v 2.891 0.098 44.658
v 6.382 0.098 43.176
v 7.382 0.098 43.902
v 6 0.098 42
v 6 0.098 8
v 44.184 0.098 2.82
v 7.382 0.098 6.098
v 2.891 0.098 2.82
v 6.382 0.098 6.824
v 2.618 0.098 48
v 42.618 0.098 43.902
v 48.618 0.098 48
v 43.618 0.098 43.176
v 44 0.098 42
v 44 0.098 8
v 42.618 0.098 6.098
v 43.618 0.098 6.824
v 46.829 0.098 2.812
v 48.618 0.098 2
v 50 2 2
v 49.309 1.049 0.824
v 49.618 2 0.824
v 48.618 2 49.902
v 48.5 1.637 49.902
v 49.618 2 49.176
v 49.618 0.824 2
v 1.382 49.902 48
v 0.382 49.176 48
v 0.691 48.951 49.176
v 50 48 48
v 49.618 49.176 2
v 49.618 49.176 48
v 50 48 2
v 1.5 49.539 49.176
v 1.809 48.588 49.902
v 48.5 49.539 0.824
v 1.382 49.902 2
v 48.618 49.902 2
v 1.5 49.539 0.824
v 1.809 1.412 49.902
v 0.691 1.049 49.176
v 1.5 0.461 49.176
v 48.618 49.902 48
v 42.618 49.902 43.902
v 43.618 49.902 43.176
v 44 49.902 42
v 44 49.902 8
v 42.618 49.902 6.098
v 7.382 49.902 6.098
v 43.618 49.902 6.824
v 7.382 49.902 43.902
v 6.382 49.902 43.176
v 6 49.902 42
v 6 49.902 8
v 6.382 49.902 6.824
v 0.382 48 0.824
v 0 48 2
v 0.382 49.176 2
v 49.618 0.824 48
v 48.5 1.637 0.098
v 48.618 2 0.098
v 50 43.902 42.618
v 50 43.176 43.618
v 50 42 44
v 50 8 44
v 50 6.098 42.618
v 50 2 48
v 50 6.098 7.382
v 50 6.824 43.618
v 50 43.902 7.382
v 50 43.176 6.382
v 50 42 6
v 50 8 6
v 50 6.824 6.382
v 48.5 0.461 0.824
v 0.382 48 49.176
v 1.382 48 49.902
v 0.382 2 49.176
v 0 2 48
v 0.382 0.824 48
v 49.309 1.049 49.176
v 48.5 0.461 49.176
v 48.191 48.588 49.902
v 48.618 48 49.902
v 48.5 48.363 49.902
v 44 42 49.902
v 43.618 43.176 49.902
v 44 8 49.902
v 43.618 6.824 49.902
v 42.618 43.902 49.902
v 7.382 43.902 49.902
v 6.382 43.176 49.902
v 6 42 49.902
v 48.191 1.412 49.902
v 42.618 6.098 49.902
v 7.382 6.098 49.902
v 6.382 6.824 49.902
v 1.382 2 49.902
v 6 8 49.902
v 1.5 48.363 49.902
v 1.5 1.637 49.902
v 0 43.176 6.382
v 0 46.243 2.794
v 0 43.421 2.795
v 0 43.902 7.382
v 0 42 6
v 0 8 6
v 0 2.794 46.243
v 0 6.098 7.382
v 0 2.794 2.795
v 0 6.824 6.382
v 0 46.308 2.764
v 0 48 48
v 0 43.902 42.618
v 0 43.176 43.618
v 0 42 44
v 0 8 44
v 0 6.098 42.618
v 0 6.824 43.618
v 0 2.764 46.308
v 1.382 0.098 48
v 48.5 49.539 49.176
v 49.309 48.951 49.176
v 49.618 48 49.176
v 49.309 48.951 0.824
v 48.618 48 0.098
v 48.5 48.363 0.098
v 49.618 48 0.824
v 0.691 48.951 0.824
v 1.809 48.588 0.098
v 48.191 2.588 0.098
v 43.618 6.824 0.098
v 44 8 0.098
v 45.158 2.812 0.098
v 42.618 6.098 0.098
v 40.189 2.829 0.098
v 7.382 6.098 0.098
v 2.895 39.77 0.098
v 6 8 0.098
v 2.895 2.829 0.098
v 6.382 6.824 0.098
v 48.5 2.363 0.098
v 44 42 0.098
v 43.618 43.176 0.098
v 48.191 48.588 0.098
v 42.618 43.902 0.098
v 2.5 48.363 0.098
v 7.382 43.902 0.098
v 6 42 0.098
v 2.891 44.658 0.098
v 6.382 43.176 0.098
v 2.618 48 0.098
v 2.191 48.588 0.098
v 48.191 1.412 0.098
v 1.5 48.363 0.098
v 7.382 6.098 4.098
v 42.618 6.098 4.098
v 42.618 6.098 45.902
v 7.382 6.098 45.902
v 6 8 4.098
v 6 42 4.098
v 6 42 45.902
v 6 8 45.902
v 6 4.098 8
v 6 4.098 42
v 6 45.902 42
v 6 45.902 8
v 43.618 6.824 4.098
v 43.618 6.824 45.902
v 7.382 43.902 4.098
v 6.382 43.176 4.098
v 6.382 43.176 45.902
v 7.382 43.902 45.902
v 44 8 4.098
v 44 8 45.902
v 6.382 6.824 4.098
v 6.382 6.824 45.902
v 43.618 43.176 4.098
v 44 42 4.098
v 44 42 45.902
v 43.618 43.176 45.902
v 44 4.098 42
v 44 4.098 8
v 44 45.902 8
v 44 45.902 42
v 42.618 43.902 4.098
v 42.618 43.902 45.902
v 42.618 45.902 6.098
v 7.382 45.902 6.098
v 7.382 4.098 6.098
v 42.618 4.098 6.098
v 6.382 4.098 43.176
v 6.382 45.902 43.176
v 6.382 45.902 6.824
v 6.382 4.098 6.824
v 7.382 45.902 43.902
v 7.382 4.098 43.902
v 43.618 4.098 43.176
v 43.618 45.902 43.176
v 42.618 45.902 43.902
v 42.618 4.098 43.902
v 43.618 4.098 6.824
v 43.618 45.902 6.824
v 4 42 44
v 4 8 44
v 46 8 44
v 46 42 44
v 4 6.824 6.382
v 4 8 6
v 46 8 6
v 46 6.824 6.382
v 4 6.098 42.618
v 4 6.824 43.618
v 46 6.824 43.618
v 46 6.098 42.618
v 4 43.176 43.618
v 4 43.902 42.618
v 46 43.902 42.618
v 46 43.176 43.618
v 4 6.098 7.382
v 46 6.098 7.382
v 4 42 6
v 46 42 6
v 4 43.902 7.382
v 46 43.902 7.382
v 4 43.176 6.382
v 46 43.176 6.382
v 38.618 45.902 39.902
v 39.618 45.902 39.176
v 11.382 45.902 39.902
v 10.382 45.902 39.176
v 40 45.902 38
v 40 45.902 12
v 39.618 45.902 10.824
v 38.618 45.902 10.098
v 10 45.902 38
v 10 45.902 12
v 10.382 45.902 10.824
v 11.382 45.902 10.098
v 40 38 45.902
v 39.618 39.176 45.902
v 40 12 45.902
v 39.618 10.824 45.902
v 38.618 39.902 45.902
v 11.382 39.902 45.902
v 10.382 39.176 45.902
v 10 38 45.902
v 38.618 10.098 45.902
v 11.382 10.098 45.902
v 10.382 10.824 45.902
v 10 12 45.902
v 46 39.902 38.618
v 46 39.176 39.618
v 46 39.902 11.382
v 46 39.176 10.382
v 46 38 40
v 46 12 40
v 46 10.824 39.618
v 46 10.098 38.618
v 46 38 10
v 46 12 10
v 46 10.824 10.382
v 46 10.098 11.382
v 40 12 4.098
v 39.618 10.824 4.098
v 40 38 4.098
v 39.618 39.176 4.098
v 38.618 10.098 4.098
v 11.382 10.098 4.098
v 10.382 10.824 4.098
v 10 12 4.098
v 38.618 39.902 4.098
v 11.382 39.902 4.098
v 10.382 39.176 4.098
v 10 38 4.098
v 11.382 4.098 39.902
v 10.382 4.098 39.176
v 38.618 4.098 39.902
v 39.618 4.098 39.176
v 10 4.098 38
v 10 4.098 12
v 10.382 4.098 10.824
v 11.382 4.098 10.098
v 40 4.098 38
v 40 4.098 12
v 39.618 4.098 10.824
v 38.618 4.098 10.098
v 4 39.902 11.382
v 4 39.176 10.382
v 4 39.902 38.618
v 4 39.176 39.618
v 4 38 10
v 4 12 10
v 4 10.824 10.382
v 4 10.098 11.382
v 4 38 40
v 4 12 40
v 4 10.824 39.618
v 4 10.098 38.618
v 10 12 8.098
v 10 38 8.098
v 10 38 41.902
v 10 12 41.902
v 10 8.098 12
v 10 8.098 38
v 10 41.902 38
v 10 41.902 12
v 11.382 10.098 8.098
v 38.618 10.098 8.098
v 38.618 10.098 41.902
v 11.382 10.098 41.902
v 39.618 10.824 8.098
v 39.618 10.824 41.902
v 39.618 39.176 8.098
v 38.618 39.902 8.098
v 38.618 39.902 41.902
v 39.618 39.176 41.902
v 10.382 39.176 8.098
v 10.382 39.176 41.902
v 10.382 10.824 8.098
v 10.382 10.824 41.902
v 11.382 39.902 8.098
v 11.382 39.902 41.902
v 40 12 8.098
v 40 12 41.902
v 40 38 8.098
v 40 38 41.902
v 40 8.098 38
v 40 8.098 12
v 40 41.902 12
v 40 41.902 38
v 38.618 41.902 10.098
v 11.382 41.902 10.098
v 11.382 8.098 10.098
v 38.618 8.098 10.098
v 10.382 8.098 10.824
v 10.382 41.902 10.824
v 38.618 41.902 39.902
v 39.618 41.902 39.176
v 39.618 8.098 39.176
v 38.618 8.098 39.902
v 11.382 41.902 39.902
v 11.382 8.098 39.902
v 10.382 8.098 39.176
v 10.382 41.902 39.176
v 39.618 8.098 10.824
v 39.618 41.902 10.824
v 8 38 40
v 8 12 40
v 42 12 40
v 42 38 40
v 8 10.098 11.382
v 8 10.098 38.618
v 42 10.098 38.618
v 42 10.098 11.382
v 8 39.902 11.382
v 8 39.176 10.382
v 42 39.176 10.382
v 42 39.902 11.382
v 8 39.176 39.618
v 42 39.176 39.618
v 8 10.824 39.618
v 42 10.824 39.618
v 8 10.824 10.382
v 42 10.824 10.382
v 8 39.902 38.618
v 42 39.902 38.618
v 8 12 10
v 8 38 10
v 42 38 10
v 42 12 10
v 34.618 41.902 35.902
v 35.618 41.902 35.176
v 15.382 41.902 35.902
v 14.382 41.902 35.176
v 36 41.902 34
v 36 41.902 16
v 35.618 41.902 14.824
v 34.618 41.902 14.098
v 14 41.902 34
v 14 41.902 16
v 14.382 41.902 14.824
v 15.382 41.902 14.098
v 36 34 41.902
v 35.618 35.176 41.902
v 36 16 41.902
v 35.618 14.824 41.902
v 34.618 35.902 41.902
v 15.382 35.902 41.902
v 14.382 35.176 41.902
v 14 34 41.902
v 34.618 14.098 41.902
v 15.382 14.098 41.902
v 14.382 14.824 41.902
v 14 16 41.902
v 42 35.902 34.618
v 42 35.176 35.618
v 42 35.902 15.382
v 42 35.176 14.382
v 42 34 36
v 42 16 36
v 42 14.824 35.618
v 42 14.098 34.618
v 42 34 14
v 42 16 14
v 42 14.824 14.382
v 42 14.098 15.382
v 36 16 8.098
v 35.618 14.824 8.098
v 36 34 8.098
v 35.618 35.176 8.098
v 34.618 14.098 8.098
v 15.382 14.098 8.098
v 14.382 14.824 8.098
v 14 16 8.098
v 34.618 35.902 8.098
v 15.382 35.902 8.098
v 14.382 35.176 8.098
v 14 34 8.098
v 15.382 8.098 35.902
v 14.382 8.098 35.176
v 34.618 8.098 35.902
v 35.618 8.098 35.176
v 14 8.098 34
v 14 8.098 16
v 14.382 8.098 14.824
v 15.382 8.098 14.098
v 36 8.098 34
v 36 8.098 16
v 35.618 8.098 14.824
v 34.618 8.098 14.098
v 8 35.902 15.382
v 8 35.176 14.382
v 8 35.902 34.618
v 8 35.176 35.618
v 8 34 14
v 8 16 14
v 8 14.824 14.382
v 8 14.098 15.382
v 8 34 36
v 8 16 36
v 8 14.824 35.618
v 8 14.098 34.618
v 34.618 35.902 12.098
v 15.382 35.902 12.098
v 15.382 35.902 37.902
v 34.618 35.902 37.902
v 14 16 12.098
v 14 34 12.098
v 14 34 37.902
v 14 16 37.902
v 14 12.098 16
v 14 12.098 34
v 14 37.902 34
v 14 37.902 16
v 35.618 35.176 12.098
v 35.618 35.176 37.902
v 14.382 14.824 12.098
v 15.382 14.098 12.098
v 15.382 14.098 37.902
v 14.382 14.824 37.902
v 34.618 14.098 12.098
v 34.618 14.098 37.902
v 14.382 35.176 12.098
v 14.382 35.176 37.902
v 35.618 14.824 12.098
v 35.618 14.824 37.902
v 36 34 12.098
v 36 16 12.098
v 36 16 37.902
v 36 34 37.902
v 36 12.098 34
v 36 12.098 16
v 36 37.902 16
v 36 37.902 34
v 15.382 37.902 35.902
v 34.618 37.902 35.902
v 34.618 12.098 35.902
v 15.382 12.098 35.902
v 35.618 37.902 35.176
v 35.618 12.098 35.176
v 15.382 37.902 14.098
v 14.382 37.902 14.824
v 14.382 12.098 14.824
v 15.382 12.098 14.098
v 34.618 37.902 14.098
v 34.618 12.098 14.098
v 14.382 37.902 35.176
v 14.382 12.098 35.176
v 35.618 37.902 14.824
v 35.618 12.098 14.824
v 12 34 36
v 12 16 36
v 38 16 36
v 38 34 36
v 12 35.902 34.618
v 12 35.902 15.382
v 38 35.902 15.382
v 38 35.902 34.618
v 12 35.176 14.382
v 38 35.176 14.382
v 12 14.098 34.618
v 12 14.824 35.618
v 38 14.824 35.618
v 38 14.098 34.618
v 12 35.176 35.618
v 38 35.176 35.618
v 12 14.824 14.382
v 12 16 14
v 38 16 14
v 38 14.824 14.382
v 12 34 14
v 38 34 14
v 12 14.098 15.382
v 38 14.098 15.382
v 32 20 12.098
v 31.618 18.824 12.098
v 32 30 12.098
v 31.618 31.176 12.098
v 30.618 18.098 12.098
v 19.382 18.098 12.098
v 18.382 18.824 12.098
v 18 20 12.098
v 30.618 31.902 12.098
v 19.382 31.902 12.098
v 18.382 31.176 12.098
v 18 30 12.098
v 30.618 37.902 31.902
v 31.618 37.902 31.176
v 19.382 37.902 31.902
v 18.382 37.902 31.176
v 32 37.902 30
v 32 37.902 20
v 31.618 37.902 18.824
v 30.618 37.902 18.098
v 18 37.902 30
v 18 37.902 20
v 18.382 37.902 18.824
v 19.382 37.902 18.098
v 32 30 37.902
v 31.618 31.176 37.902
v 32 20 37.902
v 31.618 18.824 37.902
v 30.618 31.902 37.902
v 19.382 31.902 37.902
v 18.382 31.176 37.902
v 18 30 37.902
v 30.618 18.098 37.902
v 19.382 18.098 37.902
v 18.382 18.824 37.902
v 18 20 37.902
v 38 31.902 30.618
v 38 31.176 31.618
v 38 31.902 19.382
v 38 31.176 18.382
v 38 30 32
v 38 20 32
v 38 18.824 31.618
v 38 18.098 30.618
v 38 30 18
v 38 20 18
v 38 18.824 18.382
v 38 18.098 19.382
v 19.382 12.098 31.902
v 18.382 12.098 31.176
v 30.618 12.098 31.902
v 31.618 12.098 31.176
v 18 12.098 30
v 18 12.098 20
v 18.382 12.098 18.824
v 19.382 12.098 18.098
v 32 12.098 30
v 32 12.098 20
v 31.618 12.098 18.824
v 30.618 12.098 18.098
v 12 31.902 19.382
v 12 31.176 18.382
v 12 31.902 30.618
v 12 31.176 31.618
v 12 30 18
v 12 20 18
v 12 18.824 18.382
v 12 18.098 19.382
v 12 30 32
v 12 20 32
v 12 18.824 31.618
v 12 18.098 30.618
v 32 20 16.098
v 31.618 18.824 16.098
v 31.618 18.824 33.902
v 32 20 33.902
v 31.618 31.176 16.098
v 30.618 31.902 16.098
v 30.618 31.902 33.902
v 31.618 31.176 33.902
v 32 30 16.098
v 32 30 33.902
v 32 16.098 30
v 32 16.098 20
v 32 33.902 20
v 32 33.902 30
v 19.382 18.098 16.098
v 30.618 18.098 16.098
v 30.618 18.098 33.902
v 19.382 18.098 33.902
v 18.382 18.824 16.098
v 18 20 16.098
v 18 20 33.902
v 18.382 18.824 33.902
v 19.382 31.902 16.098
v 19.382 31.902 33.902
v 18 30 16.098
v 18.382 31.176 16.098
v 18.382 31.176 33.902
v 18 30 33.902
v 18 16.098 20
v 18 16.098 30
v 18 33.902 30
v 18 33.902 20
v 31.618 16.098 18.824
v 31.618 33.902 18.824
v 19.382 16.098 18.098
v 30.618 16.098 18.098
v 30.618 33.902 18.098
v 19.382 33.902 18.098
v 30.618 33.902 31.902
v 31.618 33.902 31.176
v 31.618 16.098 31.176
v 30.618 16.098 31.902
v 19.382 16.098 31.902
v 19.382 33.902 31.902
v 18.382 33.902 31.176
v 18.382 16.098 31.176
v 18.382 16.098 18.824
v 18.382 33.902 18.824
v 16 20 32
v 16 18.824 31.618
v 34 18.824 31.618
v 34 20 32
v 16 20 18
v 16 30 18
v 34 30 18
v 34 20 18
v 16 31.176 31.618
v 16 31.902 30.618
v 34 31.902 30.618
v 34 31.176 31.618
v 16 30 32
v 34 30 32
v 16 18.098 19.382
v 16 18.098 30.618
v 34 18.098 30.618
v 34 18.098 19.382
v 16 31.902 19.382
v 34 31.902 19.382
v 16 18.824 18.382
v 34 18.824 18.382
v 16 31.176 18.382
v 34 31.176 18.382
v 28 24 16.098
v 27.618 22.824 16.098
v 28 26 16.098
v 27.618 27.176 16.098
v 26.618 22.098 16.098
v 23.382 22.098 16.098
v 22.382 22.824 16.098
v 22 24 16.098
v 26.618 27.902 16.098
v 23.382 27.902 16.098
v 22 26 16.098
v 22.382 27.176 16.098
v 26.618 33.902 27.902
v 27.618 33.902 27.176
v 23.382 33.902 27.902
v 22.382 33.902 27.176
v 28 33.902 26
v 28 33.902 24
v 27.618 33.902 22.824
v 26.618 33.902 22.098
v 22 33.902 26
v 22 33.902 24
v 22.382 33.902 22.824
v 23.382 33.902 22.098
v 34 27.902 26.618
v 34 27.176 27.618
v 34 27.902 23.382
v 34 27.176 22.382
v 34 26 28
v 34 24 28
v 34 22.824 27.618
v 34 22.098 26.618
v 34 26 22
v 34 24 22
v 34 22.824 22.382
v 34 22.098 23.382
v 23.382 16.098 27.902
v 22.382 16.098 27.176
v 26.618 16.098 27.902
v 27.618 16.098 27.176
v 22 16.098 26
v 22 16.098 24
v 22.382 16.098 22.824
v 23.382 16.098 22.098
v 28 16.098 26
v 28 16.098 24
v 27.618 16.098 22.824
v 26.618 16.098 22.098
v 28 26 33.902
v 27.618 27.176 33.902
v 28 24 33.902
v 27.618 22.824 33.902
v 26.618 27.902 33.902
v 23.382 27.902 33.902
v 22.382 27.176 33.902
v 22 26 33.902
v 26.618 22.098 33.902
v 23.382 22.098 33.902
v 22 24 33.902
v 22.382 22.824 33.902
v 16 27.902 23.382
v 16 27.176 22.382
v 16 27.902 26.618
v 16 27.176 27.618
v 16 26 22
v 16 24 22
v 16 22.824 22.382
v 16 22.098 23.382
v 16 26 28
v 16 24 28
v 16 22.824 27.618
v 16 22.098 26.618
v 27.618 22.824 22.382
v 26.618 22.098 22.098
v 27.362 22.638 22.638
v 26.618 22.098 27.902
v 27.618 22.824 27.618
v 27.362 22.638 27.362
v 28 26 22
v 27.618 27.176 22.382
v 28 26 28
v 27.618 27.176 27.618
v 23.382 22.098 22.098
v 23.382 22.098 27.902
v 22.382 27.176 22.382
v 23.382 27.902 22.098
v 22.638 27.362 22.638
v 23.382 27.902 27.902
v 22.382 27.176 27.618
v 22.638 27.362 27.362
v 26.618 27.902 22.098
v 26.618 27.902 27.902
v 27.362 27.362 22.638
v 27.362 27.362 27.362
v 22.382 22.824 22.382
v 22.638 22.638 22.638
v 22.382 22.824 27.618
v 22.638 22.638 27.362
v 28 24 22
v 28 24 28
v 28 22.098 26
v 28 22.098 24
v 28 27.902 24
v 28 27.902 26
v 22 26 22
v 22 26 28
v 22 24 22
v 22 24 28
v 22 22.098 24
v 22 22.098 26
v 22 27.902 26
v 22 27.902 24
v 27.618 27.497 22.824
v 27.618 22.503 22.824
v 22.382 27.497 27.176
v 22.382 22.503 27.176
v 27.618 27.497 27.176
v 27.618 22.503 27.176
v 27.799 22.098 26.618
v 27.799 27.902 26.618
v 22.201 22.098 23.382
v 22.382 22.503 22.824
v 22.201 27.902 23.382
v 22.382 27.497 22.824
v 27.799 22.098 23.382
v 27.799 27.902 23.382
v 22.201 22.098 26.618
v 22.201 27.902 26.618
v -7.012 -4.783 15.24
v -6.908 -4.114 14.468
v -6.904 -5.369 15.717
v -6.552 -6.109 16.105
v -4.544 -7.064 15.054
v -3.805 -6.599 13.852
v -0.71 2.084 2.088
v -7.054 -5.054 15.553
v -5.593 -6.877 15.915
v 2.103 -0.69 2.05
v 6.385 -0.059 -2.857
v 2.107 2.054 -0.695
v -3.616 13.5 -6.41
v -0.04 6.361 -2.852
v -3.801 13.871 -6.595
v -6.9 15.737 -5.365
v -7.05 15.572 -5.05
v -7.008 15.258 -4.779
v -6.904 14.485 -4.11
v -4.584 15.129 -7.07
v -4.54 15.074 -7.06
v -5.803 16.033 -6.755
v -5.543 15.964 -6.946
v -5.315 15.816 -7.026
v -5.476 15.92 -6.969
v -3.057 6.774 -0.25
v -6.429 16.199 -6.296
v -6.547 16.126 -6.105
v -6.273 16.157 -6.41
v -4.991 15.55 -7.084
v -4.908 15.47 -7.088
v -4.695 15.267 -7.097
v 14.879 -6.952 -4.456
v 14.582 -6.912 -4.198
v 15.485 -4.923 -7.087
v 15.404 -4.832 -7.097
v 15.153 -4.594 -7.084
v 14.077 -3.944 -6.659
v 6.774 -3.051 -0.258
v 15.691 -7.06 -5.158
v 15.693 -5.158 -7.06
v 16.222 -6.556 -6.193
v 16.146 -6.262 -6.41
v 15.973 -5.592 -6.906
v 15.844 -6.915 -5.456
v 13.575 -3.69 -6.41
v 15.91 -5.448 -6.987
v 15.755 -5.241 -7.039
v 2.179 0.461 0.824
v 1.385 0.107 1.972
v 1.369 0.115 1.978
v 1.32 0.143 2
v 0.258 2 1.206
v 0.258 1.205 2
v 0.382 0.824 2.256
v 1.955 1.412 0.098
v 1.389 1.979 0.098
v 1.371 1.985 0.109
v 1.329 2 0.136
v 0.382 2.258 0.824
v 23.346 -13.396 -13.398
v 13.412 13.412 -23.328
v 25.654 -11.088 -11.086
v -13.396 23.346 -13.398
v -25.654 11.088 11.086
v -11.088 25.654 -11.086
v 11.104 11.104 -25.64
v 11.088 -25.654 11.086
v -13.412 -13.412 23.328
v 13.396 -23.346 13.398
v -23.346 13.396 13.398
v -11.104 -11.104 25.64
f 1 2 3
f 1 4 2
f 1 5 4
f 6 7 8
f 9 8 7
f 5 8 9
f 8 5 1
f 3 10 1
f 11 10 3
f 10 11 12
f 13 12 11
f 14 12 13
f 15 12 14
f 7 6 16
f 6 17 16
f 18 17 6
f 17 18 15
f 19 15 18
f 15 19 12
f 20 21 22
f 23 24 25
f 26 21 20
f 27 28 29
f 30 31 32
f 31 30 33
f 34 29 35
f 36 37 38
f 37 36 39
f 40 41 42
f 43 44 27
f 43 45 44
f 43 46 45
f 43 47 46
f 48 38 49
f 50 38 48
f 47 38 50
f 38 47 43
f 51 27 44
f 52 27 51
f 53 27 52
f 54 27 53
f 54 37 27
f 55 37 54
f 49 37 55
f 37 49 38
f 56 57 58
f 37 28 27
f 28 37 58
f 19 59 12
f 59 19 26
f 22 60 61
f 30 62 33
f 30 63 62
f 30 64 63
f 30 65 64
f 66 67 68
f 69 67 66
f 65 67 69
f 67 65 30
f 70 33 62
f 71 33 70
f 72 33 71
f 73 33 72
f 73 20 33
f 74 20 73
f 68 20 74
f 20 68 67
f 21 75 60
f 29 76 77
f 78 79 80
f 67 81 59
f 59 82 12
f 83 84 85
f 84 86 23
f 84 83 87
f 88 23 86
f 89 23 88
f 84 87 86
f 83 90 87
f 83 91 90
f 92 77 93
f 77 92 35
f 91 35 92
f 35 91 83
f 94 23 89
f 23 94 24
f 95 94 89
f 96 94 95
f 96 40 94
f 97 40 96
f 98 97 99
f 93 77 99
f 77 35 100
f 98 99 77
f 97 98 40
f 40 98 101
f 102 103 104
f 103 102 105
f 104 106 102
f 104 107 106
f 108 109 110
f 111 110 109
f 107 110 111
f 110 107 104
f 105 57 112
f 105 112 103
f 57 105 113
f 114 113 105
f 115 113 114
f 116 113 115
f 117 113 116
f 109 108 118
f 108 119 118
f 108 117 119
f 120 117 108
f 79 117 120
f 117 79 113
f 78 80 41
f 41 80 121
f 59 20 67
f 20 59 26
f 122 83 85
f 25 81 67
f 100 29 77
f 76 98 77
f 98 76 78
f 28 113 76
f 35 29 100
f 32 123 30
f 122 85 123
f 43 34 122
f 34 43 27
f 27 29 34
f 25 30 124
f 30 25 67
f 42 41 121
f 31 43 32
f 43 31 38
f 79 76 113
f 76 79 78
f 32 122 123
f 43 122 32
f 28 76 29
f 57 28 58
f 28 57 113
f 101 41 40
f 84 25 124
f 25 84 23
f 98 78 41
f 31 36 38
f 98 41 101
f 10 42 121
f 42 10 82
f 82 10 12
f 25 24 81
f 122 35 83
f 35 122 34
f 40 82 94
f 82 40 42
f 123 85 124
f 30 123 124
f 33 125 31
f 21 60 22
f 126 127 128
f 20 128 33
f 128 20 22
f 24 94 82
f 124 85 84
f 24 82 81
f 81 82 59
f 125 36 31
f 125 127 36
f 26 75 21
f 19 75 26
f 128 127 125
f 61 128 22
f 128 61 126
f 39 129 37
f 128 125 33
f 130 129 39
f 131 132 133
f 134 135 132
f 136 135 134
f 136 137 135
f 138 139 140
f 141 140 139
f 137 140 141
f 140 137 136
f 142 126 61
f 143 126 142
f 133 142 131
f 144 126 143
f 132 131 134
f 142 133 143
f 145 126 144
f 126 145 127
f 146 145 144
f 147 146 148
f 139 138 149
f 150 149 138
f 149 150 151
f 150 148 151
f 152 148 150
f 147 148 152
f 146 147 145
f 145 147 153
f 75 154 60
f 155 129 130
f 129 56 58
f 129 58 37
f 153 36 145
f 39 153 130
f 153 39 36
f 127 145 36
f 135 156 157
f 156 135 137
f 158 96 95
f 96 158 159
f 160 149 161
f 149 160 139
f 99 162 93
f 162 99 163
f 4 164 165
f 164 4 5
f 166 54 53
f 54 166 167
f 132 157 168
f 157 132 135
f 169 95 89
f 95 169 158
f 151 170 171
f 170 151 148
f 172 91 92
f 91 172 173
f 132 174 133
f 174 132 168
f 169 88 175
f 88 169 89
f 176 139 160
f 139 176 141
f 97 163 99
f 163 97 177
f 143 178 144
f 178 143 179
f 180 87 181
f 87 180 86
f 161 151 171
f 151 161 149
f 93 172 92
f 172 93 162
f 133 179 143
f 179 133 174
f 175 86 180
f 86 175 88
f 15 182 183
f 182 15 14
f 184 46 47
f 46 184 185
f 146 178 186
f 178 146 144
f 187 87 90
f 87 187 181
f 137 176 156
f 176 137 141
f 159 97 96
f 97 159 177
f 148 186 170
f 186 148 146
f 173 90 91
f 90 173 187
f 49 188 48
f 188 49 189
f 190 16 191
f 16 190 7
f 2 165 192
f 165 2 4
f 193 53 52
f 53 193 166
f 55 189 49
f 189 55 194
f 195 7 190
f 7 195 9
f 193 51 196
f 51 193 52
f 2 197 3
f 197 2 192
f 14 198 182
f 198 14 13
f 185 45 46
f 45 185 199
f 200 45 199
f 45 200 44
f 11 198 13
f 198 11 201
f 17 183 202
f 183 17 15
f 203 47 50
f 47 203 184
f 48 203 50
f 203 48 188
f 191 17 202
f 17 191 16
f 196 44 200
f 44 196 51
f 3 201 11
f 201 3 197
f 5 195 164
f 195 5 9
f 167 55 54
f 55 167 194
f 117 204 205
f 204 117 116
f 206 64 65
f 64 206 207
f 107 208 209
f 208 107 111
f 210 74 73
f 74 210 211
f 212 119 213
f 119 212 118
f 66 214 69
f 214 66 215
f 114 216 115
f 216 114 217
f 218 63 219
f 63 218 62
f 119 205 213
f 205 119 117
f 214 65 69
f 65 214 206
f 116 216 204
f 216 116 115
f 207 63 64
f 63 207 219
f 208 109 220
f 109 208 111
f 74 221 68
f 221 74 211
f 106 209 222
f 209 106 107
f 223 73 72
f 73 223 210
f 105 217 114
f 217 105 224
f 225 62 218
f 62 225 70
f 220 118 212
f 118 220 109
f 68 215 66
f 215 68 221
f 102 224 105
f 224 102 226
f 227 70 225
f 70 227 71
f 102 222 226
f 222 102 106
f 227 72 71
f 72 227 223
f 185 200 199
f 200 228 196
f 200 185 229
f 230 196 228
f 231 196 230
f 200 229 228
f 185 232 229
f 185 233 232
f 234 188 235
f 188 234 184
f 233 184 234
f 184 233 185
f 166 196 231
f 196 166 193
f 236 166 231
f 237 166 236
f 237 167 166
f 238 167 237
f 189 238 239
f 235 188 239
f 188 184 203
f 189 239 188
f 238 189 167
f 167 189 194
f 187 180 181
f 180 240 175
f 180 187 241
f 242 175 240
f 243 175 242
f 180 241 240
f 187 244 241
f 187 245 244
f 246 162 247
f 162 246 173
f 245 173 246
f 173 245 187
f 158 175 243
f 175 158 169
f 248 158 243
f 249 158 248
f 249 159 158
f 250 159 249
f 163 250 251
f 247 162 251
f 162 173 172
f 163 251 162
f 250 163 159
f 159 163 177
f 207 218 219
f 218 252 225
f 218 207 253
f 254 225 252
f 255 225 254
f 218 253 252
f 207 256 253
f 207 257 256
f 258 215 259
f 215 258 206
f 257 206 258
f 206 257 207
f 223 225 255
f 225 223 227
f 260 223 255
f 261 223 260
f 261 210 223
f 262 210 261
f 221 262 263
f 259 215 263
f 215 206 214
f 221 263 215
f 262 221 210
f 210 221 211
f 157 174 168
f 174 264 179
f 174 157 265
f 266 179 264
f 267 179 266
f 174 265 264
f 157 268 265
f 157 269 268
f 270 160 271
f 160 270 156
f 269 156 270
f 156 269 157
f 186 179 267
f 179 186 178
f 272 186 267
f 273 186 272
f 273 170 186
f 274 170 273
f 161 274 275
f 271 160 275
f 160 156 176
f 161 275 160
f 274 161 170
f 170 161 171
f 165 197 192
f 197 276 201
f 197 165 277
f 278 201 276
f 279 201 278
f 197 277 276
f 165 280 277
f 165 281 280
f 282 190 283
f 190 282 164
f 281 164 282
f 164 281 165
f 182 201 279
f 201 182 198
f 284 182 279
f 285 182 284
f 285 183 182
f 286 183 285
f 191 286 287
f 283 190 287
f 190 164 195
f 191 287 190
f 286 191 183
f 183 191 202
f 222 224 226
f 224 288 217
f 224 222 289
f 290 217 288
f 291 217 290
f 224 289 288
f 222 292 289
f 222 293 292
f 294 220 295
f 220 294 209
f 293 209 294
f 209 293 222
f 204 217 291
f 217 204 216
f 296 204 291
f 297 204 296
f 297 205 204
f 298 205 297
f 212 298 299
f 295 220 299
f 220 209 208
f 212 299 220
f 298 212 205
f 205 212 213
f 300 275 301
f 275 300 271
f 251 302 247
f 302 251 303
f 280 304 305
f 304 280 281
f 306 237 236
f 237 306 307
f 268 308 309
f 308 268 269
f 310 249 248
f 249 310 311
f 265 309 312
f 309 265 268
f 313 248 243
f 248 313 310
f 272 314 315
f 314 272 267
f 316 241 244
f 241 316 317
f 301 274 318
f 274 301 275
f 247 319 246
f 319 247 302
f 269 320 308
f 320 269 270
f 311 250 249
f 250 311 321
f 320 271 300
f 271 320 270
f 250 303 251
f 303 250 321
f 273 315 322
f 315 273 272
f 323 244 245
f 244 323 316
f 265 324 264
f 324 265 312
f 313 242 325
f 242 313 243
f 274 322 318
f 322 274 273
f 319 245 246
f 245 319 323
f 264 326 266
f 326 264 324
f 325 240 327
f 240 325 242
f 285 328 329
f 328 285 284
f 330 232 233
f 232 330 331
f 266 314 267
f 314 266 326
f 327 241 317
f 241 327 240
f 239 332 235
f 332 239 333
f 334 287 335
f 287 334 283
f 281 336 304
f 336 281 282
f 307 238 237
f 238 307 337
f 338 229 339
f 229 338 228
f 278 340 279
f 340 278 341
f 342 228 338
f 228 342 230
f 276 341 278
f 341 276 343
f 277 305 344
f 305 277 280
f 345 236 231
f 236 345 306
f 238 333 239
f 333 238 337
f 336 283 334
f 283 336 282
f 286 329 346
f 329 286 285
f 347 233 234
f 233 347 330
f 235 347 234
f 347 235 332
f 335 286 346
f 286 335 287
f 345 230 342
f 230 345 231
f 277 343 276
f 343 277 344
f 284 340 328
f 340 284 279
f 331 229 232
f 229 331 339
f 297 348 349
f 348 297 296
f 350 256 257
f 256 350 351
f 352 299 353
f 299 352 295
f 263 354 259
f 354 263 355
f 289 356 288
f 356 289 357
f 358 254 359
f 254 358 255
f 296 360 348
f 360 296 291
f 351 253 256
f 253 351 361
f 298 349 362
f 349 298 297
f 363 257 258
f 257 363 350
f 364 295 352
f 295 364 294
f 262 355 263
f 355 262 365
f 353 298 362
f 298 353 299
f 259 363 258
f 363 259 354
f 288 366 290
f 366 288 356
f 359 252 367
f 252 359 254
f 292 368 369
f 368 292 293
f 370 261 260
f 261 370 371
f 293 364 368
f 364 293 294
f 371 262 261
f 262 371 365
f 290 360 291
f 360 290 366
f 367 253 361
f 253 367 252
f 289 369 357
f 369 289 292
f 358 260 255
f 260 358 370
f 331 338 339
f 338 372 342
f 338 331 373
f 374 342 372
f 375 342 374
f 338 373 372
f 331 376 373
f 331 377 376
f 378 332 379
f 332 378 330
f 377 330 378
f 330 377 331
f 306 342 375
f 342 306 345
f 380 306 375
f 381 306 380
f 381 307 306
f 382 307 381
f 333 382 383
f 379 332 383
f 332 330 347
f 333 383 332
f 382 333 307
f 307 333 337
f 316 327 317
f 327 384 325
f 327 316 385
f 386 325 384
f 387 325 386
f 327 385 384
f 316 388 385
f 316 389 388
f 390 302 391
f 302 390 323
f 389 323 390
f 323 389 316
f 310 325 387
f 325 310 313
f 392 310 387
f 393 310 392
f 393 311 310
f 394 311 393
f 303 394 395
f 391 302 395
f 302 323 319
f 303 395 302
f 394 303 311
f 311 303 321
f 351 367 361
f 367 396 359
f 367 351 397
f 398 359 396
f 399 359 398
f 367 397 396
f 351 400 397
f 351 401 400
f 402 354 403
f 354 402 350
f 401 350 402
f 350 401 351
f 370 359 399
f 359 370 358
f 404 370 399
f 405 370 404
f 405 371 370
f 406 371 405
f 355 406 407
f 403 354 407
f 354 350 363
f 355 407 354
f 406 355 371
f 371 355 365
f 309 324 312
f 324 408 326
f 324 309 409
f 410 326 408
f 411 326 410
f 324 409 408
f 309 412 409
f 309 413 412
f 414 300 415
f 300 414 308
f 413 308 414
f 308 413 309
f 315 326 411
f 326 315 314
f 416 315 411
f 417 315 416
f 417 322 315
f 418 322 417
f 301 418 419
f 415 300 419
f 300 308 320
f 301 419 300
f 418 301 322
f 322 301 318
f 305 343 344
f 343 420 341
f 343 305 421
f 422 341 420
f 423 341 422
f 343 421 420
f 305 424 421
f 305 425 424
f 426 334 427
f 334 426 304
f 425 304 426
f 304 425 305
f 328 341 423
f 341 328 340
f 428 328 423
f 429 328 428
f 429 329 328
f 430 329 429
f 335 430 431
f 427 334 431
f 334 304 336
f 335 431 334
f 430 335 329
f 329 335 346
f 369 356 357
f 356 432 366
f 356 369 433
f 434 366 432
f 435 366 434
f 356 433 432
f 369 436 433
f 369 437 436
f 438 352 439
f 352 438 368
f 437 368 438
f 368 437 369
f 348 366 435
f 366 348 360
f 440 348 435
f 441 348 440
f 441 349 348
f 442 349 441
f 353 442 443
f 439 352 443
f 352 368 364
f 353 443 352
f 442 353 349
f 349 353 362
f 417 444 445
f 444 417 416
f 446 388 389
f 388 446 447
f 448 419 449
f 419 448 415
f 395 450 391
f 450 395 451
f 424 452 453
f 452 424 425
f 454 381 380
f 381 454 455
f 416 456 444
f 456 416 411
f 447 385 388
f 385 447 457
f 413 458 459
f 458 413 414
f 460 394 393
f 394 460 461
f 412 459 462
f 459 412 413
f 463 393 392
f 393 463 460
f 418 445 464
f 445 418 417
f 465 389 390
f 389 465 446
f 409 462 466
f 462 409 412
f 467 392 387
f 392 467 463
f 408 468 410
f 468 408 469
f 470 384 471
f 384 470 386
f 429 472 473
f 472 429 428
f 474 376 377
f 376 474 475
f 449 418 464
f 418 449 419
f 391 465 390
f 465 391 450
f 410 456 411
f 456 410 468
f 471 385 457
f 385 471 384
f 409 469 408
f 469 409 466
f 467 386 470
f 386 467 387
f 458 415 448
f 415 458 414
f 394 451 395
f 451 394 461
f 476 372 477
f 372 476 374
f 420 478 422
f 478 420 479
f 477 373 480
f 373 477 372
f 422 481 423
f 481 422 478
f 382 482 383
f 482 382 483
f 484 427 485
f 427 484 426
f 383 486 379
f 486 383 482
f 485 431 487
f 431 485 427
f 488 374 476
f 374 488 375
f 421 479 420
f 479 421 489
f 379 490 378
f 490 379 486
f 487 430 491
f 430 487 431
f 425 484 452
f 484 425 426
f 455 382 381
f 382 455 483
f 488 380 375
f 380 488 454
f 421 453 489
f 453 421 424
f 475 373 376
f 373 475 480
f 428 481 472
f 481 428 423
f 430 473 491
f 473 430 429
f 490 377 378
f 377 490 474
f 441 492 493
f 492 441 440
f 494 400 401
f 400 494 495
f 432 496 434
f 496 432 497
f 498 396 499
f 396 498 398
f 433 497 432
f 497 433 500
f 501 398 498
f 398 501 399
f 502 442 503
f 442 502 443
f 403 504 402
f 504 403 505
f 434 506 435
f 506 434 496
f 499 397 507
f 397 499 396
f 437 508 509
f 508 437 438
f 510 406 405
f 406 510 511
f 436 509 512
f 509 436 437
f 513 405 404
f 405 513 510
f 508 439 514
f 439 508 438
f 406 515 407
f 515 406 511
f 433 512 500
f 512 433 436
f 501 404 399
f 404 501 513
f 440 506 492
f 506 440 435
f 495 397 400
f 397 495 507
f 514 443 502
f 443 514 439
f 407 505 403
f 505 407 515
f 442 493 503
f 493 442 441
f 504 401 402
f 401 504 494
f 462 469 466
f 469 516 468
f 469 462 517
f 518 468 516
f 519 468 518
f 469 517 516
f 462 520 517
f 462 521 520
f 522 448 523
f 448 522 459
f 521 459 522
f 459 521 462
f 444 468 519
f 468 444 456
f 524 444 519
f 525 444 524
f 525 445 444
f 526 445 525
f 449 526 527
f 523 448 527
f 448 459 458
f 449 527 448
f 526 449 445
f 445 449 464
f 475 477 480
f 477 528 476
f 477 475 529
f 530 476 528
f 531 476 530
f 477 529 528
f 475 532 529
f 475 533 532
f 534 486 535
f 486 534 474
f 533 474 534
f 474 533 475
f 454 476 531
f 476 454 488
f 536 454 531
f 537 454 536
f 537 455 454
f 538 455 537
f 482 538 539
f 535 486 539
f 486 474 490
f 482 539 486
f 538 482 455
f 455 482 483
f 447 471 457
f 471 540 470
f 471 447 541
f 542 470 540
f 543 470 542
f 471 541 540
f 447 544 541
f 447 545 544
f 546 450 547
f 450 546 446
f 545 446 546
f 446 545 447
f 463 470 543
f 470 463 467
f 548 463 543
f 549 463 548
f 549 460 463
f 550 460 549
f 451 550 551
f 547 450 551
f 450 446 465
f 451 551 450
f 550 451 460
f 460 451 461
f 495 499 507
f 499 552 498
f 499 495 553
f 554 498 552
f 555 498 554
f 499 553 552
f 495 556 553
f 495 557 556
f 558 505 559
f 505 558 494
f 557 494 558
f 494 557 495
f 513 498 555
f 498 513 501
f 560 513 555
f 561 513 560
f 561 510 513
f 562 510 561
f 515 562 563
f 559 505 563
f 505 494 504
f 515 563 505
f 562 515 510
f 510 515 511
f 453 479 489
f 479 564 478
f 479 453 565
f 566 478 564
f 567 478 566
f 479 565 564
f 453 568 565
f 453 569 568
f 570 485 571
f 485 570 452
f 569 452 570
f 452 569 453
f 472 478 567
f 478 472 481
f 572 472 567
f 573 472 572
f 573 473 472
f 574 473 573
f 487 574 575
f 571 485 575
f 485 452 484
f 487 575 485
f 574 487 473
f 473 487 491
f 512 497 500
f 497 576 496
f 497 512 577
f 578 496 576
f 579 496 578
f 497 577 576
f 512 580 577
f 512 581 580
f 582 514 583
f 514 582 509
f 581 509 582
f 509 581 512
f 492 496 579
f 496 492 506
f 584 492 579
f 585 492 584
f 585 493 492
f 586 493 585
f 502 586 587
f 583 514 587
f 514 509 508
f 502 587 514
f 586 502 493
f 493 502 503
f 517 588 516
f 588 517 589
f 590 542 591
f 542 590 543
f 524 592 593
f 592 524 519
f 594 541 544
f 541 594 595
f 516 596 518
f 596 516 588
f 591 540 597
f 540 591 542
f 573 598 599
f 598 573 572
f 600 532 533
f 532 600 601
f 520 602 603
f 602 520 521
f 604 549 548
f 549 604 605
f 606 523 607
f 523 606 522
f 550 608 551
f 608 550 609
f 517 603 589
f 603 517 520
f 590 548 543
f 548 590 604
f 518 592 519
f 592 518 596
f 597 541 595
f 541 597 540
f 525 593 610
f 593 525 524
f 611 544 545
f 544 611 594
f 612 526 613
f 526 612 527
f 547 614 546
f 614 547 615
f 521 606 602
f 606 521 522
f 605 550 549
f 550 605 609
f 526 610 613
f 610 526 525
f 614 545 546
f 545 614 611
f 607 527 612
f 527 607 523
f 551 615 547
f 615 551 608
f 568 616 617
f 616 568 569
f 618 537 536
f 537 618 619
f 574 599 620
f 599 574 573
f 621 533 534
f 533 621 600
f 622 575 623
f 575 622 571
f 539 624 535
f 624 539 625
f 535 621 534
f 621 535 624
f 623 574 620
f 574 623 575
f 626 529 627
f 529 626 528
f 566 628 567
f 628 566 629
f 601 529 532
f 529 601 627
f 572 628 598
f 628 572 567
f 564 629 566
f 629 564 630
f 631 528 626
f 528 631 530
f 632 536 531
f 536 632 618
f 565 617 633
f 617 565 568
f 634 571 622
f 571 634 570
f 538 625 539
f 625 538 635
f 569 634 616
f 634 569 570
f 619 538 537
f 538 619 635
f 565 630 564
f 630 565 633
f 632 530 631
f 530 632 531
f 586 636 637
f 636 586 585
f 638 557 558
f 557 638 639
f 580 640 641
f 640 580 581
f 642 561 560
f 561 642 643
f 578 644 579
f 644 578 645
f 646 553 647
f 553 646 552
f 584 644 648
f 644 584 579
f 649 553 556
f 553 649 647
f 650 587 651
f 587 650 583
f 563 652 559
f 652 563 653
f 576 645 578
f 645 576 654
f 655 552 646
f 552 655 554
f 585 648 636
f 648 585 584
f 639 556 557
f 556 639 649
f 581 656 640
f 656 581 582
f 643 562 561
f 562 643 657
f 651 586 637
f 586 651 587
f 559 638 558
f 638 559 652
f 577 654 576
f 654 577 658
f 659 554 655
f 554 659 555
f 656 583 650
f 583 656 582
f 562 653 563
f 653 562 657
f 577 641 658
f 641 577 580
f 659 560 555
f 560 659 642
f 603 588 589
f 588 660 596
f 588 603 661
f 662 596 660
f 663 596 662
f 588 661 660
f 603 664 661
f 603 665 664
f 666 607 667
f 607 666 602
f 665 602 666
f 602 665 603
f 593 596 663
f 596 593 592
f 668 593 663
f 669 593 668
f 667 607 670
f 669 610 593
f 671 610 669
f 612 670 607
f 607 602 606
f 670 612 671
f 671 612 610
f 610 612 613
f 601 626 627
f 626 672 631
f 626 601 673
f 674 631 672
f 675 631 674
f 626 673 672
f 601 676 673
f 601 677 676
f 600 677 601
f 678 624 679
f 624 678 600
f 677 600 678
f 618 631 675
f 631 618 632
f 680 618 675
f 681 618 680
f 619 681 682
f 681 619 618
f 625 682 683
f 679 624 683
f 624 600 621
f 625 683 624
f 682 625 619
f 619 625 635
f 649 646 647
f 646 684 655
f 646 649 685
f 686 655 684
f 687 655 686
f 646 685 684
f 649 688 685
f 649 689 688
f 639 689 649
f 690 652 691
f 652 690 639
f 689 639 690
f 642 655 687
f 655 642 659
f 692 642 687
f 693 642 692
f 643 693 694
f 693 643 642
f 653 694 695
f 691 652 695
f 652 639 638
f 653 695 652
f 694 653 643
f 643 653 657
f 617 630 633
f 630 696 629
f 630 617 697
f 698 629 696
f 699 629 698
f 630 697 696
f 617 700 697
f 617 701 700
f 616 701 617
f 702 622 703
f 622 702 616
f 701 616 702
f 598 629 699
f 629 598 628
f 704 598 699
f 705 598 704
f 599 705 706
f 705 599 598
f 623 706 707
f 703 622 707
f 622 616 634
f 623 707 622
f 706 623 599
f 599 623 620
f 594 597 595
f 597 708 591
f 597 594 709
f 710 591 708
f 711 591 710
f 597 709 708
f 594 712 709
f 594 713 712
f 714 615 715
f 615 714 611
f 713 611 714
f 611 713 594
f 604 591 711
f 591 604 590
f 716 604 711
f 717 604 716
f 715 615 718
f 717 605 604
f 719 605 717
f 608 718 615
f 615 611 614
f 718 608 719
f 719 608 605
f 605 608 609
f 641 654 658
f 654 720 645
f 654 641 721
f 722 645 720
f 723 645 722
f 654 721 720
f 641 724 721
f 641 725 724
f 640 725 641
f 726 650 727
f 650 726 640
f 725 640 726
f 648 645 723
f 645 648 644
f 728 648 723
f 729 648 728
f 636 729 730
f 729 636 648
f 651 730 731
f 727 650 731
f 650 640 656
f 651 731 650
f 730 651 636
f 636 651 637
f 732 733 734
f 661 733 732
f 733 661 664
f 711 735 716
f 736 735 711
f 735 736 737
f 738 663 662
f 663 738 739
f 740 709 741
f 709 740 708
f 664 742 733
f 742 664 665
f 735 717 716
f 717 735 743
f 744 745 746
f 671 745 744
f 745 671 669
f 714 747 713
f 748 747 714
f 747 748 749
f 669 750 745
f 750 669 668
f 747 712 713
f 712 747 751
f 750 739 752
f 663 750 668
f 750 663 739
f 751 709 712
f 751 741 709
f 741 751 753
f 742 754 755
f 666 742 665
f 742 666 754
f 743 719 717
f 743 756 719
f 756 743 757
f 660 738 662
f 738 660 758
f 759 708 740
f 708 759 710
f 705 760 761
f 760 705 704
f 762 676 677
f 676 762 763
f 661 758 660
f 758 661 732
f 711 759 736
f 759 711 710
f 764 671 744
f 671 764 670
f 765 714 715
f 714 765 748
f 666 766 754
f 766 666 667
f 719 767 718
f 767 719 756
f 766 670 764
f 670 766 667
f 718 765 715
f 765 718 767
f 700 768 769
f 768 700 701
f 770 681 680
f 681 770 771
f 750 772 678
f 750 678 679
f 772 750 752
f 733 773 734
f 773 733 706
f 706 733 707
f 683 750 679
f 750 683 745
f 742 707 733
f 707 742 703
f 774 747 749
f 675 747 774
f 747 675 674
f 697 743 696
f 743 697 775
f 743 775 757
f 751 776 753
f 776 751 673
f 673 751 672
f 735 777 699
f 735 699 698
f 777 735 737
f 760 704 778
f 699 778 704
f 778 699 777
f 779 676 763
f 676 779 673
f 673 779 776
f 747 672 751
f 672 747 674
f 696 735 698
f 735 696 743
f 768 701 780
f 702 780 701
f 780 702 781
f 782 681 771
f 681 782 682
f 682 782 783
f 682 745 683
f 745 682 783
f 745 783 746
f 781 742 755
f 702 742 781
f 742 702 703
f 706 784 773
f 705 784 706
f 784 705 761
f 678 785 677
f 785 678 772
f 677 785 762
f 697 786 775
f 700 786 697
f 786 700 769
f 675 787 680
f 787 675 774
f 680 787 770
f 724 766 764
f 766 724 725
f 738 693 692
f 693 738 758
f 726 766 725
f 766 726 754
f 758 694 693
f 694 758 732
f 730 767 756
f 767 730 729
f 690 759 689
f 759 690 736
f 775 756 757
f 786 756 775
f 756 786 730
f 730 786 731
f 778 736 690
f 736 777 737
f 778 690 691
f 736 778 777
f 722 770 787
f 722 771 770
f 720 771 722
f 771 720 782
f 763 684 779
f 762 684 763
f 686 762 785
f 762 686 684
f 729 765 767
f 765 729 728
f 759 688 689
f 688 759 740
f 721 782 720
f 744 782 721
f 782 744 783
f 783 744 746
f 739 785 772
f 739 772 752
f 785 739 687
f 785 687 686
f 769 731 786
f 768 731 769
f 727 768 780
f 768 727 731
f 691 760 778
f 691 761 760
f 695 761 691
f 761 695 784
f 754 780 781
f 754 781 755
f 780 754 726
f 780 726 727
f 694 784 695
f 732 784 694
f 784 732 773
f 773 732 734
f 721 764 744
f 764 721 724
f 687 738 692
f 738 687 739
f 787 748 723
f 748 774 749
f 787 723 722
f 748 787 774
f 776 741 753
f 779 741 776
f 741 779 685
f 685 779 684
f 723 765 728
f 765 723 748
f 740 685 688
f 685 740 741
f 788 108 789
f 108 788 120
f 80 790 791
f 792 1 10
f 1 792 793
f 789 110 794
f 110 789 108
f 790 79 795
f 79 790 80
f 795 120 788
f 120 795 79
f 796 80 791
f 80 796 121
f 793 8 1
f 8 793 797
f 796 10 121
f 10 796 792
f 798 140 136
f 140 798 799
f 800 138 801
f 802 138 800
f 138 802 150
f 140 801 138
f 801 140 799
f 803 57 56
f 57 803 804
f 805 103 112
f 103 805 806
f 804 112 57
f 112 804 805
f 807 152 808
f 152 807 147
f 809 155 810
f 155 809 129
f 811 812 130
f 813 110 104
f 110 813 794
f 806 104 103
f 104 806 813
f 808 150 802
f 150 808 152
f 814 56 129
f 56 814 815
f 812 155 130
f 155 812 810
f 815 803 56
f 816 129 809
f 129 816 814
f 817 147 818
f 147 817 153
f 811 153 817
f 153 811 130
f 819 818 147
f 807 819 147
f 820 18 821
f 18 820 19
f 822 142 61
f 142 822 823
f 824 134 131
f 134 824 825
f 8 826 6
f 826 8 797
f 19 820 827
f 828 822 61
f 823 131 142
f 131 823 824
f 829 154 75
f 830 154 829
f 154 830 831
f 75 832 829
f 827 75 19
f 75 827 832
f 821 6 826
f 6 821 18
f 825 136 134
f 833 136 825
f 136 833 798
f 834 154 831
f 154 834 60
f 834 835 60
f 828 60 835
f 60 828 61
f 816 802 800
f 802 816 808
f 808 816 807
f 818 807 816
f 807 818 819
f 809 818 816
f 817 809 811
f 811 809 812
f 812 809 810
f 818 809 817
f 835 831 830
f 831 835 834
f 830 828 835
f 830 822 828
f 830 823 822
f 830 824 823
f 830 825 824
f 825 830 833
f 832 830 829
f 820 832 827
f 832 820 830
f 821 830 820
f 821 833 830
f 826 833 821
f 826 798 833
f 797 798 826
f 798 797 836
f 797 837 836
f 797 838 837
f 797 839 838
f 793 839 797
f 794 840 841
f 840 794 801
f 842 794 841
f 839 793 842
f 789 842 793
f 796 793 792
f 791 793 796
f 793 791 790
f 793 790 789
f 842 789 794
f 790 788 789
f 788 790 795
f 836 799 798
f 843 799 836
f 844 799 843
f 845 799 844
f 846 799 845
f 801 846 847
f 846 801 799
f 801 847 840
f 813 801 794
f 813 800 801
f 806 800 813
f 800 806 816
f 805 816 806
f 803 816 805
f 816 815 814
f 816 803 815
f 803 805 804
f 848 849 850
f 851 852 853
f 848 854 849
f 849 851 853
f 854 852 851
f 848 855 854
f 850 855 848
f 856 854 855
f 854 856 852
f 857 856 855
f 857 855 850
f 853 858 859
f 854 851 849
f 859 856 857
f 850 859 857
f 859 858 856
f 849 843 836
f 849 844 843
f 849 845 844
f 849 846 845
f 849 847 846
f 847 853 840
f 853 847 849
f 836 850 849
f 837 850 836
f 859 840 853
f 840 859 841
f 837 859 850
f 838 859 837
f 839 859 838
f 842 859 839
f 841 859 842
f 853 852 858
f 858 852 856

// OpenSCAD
// Started on 2019/08/27 
// Ended on 2019/08/28
// Made by anv3d
// PLEASE give credit if used!
//v1.4

// c = cube 
// f = frame


/* [Cube] */

// Number of cubes (default 5) Note: If not enough cubes show up, try decreasing 'f_w' variable, or increasing 'c_size' variable.
num_cubes = 5; 

// Size of the biggest cube. (default 50)
c_size = 50; 

// Width of the cube frame. (default 4)
f_w = 4; 

// Round radius of outside. (default 2)
f_rad_o = 2; 

// Round radius of inner cuts. (default 2)
f_rad_i = 2; 

// Resolution. (lower to test for faster rendering, raise for final model and higher quality)
fn = 10; 

/* [Base] */

// Enables or disables a base to display on a corner. (1-true, 0-false)
base = 1;    

// Base size modifier. Not a measurement. (default 10)
b_mod = 10; 

// Thickness of the base. (default 4)
b_thickness = 4;

// Diameter of the base. (default 60)
b_diameter = 60; 

// Number of sides on the base. (default 6)
b_sides = 6; 


/* [Hidden] */
dec = f_w;
//c_size = cube_size+f_w*2;
// Modules 

module rCube(x,y,z,rd,fn){ // From HullCube.scad
    $fn=fn;
    hull(){
        translate([rd,rd,rd]) sphere(rd);
        translate([x-rd,rd,rd]) sphere(rd);
        translate([x-rd,y-rd,rd]) sphere(rd);
        translate([rd,y-rd,rd]) sphere(rd);
        translate([rd,rd,z-rd]) sphere(rd);
        translate([x-rd,rd,z-rd]) sphere(rd);
        translate([x-rd,y-rd,z-rd]) sphere(rd);
        translate([rd,y-rd,z-rd]) sphere(rd);
    }
}
module cubeF(cs,ro,f_width){ // Cube frame
    difference(){
        rCube(cs,cs,cs,ro,fn);
        
        translate([f_width,f_width,-cs/2]) rCube(cs-(f_width*2),cs-(f_width*2),cs*2,f_rad_i,fn);
    
        
        rotate([90,0,0])translate([f_width,f_width,-cs*1.5])  rCube(cs-(f_width*2),cs-(f_width*2),cs*2,f_rad_i,fn);
        
        rotate([0,90,0])translate([-cs+f_width,f_width,-cs/2])  rCube(cs-(f_width*2),cs-(f_width*2),cs*2,f_rad_i,fn);
    }
}

module cubeT(n){
    for(i=[1:n]){
        translate([dec*(i-1),dec*(i-1),dec*(i-1)]) cubeF((c_size+(dec*2))-((dec*i)*2),f_rad_o,f_w*1.5);
    }
}
module stand(){
    difference(){
        union(){
    
           hull(){
               translate([f_rad_o,f_rad_o,f_rad_o]) sphere(r=f_rad_o,$fn=fn);
               translate([f_rad_o,f_rad_o,c_size-f_rad_o]) sphere(r=f_rad_o,$fn=fn);
               translate([f_rad_o-b_mod,f_rad_o-b_mod,f_rad_o]) sphere(r=f_rad_o,$fn=fn);
               rotate([180,90-35.3,45]) translate([0,0,b_thickness]) sphere(r=f_rad_o,$fn=fn);
       
           }
       
           hull(){
               translate([f_rad_o,f_rad_o,f_rad_o]) sphere(r=f_rad_o,$fn=fn);
               translate([f_rad_o,c_size-f_rad_o,f_rad_o]) sphere(r=f_rad_o,$fn=fn);
               translate([f_rad_o-b_mod,f_rad_o,f_rad_o-b_mod]) sphere(r=f_rad_o,$fn=fn);
               rotate([180,90-35.3,45]) translate([0,0,b_thickness]) sphere(r=f_rad_o,$fn=fn);
           
           }
       
           hull(){
               translate([f_rad_o,f_rad_o,f_rad_o]) sphere(r=f_rad_o,$fn=fn);
               translate([c_size-f_rad_o,f_rad_o,f_rad_o]) sphere(r=f_rad_o,$fn=fn);
               translate([f_rad_o,f_rad_o-b_mod,f_rad_o-b_mod]) sphere(r=f_rad_o,$fn=fn);
               rotate([180,90-35.3,45]) translate([0,0,b_thickness]) sphere(r=f_rad_o,$fn=fn);
           
           }
       }
       rotate([180,90-35.3,45]) translate([0,0,-f_w*0.5]) cylinder(d=b_diameter,h=b_mod*2); // flatten base
    }
    rotate([180,90-35.3,45]) translate([0,0,-f_w*0.5]) cylinder(d=b_diameter,h=b_thickness,$fn=b_sides); // base cylinder
}

/* Run */
cubeT(num_cubes); // cubes
if (base==1){
    stand();
}
